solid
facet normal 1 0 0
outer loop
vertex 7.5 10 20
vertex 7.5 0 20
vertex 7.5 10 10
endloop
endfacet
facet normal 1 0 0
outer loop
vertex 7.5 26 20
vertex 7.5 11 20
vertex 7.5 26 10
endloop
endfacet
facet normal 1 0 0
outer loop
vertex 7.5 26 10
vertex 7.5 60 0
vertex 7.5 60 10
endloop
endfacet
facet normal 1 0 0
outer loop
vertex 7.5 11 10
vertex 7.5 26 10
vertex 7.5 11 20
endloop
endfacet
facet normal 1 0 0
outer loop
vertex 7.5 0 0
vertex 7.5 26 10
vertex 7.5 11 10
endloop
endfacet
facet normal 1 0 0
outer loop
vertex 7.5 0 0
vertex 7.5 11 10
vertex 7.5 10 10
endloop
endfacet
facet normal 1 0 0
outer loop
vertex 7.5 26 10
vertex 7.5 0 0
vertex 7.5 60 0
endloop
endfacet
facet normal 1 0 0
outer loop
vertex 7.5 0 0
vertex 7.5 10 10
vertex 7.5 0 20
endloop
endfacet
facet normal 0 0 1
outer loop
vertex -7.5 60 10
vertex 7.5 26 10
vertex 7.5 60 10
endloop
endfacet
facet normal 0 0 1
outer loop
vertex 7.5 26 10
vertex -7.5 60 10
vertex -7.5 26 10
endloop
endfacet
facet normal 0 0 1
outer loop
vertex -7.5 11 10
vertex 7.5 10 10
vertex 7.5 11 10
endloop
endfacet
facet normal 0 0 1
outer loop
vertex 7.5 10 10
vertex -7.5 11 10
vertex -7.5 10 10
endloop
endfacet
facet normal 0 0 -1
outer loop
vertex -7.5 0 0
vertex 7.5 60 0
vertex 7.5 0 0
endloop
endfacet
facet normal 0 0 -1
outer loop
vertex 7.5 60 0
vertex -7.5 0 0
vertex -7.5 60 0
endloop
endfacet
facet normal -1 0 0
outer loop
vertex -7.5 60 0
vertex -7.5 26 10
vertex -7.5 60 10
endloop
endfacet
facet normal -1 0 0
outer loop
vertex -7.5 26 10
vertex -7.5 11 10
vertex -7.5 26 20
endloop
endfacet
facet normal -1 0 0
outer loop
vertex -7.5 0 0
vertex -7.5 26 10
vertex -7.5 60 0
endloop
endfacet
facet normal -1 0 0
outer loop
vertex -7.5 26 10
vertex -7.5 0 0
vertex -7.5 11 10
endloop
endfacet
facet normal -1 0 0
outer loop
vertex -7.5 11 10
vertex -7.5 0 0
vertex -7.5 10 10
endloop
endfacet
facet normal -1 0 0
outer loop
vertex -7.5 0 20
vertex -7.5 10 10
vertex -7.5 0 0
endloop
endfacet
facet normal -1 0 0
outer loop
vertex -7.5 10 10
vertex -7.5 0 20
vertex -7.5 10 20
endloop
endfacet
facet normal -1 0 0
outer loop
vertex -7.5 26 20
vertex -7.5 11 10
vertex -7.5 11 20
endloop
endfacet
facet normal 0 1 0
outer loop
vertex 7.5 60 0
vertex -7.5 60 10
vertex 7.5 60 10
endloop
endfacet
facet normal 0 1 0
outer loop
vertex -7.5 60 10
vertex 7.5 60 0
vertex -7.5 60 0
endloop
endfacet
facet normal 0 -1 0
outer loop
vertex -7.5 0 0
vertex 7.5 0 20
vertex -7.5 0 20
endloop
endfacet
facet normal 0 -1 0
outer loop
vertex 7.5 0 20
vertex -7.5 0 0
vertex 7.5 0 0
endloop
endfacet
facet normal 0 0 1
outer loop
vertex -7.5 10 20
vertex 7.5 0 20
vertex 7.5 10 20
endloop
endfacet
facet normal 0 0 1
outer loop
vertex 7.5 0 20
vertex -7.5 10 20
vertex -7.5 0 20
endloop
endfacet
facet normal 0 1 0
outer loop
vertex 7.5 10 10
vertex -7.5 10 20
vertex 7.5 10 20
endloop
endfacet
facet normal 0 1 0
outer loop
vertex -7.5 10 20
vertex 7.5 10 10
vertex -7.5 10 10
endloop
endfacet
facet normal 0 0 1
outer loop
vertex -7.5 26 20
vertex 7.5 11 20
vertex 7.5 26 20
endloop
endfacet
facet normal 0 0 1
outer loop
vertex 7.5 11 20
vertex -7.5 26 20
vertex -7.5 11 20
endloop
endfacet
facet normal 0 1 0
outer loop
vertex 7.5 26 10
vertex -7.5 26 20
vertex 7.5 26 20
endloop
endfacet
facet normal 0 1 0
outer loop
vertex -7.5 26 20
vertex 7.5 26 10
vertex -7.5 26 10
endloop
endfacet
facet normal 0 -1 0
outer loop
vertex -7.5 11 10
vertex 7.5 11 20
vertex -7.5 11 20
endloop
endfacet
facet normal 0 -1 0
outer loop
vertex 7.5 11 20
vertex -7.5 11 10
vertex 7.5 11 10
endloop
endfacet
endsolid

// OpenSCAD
// Rendering Quality
$fn = 60;

// Vice Parameter
hight = 20;
length = 60;
width = 15;
jaw_hight = 10;

fixed_jaw_length = 10;
sliding_jaw_length = 15;

opening = 1;


translate([0, 0, 0]) base_fixed_jaw();
translate([0, fixed_jaw_length + opening, 0]) sliding_jaw();

module base_fixed_jaw(){
    color("darkgray"){
        translate([-width/2,0,0])cube([width, length, hight - jaw_hight]);
        translate([-width/2,0,0])cube([width, fixed_jaw_length, hight]);
        }
    }

module sliding_jaw() {
    color("lightcyan"){
        translate([-width/2,0,hight - jaw_hight]) cube([width, sliding_jaw_length, hight - jaw_hight]);
        }
    }
